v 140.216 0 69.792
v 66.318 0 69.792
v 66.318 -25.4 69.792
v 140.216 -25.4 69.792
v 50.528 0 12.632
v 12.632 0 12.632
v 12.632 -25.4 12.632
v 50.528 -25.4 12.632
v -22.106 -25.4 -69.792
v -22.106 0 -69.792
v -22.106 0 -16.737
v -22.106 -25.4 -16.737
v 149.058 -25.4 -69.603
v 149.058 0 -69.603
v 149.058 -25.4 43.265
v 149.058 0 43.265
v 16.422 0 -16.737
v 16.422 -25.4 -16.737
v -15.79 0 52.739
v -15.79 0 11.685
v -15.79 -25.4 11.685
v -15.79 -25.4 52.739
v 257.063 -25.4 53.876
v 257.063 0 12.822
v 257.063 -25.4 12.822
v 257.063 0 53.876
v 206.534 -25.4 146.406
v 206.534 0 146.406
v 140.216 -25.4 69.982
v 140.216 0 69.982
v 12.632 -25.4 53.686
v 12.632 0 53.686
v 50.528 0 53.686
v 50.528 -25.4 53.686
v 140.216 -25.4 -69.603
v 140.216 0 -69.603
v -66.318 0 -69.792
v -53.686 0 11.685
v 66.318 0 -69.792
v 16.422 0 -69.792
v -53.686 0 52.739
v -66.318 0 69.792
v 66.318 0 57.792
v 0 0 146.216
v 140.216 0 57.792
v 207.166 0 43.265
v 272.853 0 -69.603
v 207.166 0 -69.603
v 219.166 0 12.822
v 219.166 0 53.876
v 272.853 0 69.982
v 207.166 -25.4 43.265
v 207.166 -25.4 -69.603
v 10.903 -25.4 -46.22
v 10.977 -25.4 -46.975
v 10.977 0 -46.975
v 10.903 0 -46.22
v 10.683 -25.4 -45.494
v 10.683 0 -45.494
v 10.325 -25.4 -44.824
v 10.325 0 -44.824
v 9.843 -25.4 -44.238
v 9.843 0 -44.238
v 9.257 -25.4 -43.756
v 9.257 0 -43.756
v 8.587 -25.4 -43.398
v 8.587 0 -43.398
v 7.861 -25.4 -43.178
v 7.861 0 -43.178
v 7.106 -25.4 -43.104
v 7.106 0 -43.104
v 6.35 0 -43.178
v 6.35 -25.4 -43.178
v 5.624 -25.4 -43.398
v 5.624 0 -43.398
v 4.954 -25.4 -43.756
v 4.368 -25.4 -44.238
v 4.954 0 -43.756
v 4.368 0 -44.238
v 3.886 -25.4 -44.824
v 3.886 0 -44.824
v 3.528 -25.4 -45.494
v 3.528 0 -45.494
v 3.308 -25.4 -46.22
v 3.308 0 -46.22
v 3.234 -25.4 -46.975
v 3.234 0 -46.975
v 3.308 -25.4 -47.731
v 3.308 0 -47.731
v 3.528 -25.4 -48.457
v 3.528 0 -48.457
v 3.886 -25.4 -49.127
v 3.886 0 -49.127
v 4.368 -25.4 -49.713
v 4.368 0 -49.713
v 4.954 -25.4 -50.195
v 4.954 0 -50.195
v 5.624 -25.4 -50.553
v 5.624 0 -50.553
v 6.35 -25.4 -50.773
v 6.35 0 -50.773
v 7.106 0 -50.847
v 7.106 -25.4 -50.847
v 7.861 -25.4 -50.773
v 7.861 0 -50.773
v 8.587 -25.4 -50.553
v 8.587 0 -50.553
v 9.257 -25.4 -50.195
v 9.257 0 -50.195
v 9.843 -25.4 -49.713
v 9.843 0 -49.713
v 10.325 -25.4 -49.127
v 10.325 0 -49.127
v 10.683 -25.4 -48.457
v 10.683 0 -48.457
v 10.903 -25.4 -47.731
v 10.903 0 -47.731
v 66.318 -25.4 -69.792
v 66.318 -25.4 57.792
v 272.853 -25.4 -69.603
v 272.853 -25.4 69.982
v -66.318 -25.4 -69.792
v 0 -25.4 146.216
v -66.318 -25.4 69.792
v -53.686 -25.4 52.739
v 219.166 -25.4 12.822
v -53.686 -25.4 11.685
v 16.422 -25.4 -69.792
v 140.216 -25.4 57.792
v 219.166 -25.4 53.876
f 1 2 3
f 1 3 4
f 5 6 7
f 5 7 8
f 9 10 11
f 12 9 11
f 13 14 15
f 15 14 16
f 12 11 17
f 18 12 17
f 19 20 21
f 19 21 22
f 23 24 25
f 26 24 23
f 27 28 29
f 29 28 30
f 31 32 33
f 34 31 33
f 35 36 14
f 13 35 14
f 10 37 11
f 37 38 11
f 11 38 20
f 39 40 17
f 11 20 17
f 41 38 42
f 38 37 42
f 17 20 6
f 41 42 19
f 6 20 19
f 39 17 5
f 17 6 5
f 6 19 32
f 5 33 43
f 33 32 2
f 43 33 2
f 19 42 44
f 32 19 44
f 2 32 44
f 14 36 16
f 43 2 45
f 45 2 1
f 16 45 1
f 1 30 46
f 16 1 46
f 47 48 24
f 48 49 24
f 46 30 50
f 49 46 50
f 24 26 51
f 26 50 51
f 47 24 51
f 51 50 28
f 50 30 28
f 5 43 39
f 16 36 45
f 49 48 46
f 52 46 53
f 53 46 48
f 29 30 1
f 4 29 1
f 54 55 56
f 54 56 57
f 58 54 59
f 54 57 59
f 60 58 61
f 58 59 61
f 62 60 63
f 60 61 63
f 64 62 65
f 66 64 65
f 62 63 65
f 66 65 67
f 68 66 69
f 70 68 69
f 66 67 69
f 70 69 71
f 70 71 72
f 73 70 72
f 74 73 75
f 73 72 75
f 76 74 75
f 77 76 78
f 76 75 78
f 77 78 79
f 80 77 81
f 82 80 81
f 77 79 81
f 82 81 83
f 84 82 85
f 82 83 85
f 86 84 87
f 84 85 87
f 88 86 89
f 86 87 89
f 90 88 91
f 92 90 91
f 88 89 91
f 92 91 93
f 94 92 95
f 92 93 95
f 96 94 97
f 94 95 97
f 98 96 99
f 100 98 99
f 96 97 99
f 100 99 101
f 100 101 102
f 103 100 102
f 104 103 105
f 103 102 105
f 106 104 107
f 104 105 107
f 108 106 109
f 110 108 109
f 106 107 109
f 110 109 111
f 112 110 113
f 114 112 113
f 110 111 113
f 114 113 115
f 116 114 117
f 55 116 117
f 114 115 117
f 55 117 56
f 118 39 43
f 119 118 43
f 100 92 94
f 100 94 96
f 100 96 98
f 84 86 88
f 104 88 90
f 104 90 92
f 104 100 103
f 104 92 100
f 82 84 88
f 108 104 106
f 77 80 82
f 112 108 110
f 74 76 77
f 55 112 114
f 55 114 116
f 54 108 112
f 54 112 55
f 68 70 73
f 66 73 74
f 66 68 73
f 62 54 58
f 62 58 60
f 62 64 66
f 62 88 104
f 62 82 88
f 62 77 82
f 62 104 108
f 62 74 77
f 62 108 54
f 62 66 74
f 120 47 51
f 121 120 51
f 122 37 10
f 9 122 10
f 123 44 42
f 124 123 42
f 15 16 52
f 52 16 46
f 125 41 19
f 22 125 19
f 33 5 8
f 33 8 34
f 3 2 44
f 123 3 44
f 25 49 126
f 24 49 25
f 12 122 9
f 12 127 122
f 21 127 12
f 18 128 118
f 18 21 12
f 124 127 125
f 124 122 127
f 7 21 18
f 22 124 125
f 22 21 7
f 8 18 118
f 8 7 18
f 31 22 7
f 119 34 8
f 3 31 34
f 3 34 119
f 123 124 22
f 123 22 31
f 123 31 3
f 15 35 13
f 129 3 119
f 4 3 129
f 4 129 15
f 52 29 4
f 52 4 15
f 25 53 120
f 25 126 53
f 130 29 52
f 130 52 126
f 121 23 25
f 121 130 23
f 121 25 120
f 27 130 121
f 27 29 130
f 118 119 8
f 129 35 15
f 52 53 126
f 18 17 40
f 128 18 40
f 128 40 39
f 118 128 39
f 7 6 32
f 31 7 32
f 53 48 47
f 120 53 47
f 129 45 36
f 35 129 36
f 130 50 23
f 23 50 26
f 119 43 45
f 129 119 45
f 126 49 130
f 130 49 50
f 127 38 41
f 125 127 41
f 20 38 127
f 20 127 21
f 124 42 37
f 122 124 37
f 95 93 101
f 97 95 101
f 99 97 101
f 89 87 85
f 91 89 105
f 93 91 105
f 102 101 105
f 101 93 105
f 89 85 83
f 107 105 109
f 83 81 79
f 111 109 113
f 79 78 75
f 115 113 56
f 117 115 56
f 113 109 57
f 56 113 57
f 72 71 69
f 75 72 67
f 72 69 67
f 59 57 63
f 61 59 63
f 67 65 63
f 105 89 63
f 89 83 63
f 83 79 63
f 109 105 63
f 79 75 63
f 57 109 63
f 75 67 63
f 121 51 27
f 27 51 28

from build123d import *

# Parameters (mm, degrees)
F0_W     = 37.896203
F0_H     = 41.054218
F0_R     = 3.87179
F0_W_2   = 37.896202
F0_W_3   = 73.897578
F0_H_2   = 12.000464
F1_DEPTH = 25.4


with BuildPart() as f1:
    # F0 (on Front) → F1 (new body)
    with BuildSketch(Plane.XZ):
        Polygon((66.318356, 69.792174), (-66.318356, 69.792174), (-66.318356, -69.792174), (-22.106117, -69.792174), (-22.106117, -16.737485), (16.421689, -16.737485), (16.421689, -69.792174), (66.318356, -69.792174), (66.318356, 57.79171), align=None)
        with Locations((-34.738186, 32.211774)):
            Rectangle(F0_W, F0_H, mode=Mode.SUBTRACT)
        with Locations((31.58016, 33.159174)):
            Rectangle(F0_W, F0_H, mode=Mode.SUBTRACT)
        with Locations((7.105537, -46.975498)):
            Circle(F0_R)
        Polygon((0, 146.216184), (-66.318356, 69.792174), (66.318356, 69.792174), align=None)
        Polygon((140.215934, 69.981652), (140.215934, 69.792174), (140.215934, 57.79171), (140.215934, -69.602696), (149.058387, -69.602696), (149.058387, 43.264832), (207.165897, 43.264832), (207.165897, -69.602696), (272.852645, -69.602696), (272.852645, 69.981652), align=None)
        with Locations((238.114449, 33.348652)):
            Rectangle(F0_W_2, F0_H, mode=Mode.SUBTRACT)
        Polygon((206.53429, 146.405662), (140.215934, 69.981652), (272.852645, 69.981652), align=None)
        with Locations((103.267145, 63.791942)):
            Rectangle(F0_W_3, F0_H_2)
    extrude(amount=F1_DEPTH)


solid = f1.part
